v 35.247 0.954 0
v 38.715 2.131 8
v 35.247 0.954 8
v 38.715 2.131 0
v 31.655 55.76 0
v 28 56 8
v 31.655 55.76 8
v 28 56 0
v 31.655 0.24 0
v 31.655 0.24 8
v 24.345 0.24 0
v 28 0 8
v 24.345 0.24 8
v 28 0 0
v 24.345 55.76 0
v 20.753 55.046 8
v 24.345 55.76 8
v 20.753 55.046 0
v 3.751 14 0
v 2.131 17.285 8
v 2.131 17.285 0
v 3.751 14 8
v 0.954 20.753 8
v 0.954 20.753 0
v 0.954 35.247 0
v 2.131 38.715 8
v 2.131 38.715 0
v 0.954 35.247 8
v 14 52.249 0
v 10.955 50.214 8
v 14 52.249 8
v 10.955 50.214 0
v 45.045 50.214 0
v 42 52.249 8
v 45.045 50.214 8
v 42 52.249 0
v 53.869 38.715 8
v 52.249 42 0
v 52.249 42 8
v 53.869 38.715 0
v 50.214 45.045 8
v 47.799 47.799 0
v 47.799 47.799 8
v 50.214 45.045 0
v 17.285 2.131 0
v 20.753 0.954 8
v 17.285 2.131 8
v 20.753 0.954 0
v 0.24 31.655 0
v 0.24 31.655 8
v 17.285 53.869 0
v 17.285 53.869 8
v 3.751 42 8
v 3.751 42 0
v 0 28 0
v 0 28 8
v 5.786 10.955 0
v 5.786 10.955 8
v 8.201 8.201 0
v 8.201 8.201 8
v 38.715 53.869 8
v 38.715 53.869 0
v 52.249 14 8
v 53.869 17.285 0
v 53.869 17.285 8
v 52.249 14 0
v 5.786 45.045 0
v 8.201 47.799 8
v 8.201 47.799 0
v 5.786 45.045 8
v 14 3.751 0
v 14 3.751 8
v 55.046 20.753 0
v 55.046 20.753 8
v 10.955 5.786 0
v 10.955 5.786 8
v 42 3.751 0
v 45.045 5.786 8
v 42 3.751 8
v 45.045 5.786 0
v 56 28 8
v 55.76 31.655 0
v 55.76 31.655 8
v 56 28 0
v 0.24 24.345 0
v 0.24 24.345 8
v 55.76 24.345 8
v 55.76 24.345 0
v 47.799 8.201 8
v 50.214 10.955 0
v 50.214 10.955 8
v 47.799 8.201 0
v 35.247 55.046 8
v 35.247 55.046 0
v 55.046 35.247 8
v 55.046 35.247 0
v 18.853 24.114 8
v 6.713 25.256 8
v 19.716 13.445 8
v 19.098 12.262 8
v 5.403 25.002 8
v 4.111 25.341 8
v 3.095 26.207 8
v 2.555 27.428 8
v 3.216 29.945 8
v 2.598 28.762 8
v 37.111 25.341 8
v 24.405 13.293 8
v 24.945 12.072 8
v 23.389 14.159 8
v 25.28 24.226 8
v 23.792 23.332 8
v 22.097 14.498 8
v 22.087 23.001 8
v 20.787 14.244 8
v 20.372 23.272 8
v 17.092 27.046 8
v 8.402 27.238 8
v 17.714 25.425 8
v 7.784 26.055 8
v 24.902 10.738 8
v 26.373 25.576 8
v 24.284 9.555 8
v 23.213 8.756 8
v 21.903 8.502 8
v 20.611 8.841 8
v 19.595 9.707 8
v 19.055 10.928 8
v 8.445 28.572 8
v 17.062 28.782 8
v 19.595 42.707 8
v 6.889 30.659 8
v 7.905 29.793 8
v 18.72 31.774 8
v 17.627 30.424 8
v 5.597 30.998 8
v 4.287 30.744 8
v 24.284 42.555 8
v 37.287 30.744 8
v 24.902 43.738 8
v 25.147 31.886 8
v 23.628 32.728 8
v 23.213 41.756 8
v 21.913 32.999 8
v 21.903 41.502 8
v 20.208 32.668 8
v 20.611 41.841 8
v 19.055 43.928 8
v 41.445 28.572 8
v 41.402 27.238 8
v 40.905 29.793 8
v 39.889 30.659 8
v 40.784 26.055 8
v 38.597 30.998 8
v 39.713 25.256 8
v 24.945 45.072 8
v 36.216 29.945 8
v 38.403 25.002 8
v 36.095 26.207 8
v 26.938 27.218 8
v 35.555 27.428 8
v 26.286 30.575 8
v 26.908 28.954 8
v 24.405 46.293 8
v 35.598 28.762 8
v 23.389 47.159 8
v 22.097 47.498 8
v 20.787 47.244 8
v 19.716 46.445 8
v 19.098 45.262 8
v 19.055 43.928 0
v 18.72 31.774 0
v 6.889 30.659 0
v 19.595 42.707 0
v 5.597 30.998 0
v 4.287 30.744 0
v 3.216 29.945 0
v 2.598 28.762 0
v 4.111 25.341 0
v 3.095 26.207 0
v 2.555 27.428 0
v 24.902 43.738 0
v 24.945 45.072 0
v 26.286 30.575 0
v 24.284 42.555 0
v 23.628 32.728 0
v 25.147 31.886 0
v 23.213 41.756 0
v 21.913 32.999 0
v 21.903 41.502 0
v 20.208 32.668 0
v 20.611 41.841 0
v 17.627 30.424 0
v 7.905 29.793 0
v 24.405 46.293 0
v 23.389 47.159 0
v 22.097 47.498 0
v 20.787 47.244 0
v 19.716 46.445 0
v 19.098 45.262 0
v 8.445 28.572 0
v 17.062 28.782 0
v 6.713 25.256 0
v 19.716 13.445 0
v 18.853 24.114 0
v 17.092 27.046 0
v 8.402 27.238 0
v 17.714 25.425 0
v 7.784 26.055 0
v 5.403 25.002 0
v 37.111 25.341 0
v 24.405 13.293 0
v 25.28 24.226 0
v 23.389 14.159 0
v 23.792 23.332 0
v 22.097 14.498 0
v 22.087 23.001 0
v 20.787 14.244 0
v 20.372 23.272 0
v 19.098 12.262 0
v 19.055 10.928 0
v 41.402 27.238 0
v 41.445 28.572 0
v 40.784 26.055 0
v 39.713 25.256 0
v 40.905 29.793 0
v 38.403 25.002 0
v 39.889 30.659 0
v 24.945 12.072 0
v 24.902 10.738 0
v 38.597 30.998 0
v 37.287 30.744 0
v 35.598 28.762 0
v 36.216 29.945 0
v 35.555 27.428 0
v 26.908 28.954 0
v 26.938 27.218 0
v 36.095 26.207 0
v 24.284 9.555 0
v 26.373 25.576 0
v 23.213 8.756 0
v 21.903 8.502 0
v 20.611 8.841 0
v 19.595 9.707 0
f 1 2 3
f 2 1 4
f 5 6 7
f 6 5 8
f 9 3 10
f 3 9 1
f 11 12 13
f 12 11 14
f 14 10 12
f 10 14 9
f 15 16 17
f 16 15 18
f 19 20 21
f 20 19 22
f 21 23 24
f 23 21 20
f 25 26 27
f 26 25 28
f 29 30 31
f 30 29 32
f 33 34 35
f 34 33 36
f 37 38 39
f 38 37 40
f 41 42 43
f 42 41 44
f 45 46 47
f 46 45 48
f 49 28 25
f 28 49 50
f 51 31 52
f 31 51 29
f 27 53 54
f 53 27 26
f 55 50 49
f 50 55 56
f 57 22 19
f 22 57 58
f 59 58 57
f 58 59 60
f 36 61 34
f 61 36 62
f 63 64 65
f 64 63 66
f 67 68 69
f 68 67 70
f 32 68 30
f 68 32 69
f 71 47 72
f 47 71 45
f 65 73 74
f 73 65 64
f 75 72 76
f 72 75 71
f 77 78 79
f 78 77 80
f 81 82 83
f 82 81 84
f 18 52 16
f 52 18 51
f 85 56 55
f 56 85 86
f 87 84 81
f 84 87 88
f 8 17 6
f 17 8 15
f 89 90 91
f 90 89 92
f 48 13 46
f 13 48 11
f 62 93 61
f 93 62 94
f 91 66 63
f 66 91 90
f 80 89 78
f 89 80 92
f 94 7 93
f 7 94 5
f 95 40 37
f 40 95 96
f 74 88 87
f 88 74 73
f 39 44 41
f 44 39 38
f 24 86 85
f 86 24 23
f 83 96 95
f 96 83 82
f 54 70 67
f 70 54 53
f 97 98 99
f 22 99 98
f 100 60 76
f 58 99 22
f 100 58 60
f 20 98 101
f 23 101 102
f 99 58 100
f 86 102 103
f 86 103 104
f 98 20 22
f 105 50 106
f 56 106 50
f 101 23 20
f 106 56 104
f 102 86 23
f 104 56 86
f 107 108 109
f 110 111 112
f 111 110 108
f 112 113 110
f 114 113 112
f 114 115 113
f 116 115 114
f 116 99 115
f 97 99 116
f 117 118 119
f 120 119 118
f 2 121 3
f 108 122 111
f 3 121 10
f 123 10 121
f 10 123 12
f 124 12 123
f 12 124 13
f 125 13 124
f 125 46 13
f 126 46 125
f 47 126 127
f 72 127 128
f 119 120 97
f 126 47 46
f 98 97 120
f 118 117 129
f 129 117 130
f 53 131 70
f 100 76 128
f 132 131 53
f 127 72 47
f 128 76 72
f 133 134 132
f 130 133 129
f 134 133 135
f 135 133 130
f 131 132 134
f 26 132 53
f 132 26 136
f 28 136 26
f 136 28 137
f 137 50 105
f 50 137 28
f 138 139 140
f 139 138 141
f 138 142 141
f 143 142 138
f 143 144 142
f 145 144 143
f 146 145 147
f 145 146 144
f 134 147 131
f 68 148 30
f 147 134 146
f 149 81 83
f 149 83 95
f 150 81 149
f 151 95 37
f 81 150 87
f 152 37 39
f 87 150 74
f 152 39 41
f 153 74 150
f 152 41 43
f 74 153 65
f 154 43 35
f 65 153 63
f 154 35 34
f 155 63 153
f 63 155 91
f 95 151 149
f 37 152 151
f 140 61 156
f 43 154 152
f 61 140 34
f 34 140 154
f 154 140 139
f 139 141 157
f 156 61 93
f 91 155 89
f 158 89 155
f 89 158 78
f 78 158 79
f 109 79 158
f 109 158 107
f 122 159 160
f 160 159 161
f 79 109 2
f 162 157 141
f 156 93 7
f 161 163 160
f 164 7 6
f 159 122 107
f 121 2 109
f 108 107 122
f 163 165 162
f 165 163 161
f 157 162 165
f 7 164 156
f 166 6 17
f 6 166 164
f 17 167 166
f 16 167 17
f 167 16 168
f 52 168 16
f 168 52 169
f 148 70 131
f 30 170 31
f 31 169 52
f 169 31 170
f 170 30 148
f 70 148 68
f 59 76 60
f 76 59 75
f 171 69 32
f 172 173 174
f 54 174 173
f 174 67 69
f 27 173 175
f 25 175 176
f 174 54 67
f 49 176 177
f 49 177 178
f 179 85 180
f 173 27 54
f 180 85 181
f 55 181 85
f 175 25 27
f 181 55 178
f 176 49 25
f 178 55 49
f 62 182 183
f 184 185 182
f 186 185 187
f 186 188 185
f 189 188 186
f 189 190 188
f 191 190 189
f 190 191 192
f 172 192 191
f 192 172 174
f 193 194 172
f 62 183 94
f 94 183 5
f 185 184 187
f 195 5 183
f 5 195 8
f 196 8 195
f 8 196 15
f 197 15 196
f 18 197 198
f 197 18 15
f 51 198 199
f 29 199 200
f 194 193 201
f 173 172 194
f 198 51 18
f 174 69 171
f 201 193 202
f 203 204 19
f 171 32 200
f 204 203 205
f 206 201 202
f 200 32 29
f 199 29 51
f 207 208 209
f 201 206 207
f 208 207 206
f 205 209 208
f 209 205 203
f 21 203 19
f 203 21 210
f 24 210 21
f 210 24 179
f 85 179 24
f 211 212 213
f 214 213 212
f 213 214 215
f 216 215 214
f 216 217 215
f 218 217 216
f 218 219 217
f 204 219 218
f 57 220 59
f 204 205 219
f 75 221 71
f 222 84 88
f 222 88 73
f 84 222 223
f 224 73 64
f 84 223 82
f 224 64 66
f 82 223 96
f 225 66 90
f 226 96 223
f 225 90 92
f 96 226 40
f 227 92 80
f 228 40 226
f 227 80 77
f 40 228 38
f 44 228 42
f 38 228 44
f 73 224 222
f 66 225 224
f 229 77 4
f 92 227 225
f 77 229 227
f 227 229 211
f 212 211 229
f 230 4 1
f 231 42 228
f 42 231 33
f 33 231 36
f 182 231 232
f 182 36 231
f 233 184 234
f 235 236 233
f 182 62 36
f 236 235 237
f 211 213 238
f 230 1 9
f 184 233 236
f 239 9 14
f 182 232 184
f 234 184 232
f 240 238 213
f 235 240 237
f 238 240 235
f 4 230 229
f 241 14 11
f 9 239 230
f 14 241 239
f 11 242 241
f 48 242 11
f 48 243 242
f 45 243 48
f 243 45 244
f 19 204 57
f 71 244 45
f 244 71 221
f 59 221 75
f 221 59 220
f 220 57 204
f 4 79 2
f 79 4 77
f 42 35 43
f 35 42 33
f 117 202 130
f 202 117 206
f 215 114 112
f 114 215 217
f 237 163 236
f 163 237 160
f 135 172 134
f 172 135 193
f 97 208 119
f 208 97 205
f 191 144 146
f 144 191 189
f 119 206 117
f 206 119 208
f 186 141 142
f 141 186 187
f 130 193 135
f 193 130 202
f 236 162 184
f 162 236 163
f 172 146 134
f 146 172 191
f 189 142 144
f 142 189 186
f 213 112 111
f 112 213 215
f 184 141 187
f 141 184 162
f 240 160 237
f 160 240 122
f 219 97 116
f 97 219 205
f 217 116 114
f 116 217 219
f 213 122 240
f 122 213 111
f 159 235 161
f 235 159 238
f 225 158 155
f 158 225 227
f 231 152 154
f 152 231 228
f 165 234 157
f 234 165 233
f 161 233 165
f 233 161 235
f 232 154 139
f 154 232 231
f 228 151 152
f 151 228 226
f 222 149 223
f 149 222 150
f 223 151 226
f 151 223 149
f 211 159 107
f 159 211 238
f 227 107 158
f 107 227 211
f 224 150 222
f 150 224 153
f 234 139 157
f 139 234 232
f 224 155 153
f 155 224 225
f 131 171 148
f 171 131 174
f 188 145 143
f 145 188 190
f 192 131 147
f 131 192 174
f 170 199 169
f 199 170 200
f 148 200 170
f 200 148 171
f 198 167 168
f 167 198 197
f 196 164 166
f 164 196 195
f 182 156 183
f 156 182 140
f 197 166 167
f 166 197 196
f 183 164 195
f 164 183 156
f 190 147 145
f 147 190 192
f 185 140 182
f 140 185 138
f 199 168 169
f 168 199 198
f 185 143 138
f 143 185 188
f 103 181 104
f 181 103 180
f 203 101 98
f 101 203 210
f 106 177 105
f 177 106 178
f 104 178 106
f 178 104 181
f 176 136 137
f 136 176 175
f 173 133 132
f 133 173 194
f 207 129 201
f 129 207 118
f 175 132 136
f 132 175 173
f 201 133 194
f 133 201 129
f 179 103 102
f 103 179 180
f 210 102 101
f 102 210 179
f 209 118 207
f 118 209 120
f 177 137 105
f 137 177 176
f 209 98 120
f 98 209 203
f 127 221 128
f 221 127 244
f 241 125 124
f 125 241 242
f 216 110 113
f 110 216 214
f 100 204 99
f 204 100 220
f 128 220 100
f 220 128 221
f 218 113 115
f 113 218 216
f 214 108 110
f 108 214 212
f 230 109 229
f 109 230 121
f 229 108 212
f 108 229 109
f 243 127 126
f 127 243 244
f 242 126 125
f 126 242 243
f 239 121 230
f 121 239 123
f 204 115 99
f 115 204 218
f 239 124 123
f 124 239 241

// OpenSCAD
$fn = 32;

// ----------------------------------------------------------------------
// Cam plate: eccentric cam, base R28
// ----------------------------------------------------------------------

// --- parameters (mm) ---
base_r = 28;              // base circle radius
lobe_h = 10;              // cam lobe rise
bore_r = 5;               // shaft bore radius
plate_t = 8;              // plate thickness, Z (extrusion height)
ecc = 6;                  // disc eccentricity
ring_r = 16.5;            // lightening ring radius
bolt_r = 3;               // lightening hole radius

profile = [[56, 28], [55.76, 31.655], [55.046, 35.247], [53.869, 38.715], [52.249, 42], [50.214, 45.045], [47.799, 47.799], [45.045, 50.214], [42, 52.249], [38.715, 53.869], [35.247, 55.046], [31.655, 55.76], [28, 56], [24.345, 55.76], [20.753, 55.046], [17.285, 53.869], [14, 52.249], [10.955, 50.214], [8.201, 47.799], [5.786, 45.045], [3.751, 42], [2.131, 38.715], [0.954, 35.247], [0.24, 31.655], [0, 28], [0.24, 24.345], [0.954, 20.753], [2.131, 17.285], [3.751, 14], [5.786, 10.955], [8.201, 8.201], [10.955, 5.786], [14, 3.751], [17.285, 2.131], [20.753, 0.954], [24.345, 0.24], [28, 0], [31.655, 0.24], [35.247, 0.954], [38.715, 2.131], [42, 3.751], [45.045, 5.786], [47.799, 8.201], [50.214, 10.955], [52.249, 14], [53.869, 17.285], [55.046, 20.753], [55.76, 24.345]];  // primary outline, 48 points, counter clockwise
void_1 = [[26.908, 28.954], [26.286, 30.575], [25.147, 31.886], [23.628, 32.728], [21.913, 32.999], [20.208, 32.668], [18.72, 31.774], [17.627, 30.424], [17.062, 28.782], [17.092, 27.046], [17.714, 25.425], [18.853, 24.114], [20.372, 23.272], [22.087, 23.001], [23.792, 23.332], [25.28, 24.226], [26.373, 25.576], [26.938, 27.218]];  // shaft bore, 18 points
void_2 = [[41.445, 28.572], [40.905, 29.793], [39.889, 30.659], [38.597, 30.998], [37.287, 30.744], [36.216, 29.945], [35.598, 28.762], [35.555, 27.428], [36.095, 26.207], [37.111, 25.341], [38.403, 25.002], [39.713, 25.256], [40.784, 26.055], [41.402, 27.238]];  // lightening hole 1, 14 points
void_3 = [[24.945, 45.072], [24.405, 46.293], [23.389, 47.159], [22.097, 47.498], [20.787, 47.244], [19.716, 46.445], [19.098, 45.262], [19.055, 43.928], [19.595, 42.707], [20.611, 41.841], [21.903, 41.502], [23.213, 41.756], [24.284, 42.555], [24.902, 43.738]];  // lightening hole 2, 14 points
void_4 = [[8.445, 28.572], [7.905, 29.793], [6.889, 30.659], [5.597, 30.998], [4.287, 30.744], [3.216, 29.945], [2.598, 28.762], [2.555, 27.428], [3.095, 26.207], [4.111, 25.341], [5.403, 25.002], [6.713, 25.256], [7.784, 26.055], [8.402, 27.238]];  // lightening hole 3, 14 points
void_5 = [[24.945, 12.072], [24.405, 13.293], [23.389, 14.159], [22.097, 14.498], [20.787, 14.244], [19.716, 13.445], [19.098, 12.262], [19.055, 10.928], [19.595, 9.707], [20.611, 8.841], [21.903, 8.502], [23.213, 8.756], [24.284, 9.555], [24.902, 10.738]];  // lightening hole 4, 14 points

// --- the one profile operation ---
difference() {
  linear_extrude(height = plate_t) polygon(points = profile);
  translate([0, 0, -1])
    linear_extrude(height = plate_t + 2) polygon(points = void_1);
  translate([0, 0, -1])
    linear_extrude(height = plate_t + 2) polygon(points = void_2);
  translate([0, 0, -1])
    linear_extrude(height = plate_t + 2) polygon(points = void_3);
  translate([0, 0, -1])
    linear_extrude(height = plate_t + 2) polygon(points = void_4);
  translate([0, 0, -1])
    linear_extrude(height = plate_t + 2) polygon(points = void_5);
}
